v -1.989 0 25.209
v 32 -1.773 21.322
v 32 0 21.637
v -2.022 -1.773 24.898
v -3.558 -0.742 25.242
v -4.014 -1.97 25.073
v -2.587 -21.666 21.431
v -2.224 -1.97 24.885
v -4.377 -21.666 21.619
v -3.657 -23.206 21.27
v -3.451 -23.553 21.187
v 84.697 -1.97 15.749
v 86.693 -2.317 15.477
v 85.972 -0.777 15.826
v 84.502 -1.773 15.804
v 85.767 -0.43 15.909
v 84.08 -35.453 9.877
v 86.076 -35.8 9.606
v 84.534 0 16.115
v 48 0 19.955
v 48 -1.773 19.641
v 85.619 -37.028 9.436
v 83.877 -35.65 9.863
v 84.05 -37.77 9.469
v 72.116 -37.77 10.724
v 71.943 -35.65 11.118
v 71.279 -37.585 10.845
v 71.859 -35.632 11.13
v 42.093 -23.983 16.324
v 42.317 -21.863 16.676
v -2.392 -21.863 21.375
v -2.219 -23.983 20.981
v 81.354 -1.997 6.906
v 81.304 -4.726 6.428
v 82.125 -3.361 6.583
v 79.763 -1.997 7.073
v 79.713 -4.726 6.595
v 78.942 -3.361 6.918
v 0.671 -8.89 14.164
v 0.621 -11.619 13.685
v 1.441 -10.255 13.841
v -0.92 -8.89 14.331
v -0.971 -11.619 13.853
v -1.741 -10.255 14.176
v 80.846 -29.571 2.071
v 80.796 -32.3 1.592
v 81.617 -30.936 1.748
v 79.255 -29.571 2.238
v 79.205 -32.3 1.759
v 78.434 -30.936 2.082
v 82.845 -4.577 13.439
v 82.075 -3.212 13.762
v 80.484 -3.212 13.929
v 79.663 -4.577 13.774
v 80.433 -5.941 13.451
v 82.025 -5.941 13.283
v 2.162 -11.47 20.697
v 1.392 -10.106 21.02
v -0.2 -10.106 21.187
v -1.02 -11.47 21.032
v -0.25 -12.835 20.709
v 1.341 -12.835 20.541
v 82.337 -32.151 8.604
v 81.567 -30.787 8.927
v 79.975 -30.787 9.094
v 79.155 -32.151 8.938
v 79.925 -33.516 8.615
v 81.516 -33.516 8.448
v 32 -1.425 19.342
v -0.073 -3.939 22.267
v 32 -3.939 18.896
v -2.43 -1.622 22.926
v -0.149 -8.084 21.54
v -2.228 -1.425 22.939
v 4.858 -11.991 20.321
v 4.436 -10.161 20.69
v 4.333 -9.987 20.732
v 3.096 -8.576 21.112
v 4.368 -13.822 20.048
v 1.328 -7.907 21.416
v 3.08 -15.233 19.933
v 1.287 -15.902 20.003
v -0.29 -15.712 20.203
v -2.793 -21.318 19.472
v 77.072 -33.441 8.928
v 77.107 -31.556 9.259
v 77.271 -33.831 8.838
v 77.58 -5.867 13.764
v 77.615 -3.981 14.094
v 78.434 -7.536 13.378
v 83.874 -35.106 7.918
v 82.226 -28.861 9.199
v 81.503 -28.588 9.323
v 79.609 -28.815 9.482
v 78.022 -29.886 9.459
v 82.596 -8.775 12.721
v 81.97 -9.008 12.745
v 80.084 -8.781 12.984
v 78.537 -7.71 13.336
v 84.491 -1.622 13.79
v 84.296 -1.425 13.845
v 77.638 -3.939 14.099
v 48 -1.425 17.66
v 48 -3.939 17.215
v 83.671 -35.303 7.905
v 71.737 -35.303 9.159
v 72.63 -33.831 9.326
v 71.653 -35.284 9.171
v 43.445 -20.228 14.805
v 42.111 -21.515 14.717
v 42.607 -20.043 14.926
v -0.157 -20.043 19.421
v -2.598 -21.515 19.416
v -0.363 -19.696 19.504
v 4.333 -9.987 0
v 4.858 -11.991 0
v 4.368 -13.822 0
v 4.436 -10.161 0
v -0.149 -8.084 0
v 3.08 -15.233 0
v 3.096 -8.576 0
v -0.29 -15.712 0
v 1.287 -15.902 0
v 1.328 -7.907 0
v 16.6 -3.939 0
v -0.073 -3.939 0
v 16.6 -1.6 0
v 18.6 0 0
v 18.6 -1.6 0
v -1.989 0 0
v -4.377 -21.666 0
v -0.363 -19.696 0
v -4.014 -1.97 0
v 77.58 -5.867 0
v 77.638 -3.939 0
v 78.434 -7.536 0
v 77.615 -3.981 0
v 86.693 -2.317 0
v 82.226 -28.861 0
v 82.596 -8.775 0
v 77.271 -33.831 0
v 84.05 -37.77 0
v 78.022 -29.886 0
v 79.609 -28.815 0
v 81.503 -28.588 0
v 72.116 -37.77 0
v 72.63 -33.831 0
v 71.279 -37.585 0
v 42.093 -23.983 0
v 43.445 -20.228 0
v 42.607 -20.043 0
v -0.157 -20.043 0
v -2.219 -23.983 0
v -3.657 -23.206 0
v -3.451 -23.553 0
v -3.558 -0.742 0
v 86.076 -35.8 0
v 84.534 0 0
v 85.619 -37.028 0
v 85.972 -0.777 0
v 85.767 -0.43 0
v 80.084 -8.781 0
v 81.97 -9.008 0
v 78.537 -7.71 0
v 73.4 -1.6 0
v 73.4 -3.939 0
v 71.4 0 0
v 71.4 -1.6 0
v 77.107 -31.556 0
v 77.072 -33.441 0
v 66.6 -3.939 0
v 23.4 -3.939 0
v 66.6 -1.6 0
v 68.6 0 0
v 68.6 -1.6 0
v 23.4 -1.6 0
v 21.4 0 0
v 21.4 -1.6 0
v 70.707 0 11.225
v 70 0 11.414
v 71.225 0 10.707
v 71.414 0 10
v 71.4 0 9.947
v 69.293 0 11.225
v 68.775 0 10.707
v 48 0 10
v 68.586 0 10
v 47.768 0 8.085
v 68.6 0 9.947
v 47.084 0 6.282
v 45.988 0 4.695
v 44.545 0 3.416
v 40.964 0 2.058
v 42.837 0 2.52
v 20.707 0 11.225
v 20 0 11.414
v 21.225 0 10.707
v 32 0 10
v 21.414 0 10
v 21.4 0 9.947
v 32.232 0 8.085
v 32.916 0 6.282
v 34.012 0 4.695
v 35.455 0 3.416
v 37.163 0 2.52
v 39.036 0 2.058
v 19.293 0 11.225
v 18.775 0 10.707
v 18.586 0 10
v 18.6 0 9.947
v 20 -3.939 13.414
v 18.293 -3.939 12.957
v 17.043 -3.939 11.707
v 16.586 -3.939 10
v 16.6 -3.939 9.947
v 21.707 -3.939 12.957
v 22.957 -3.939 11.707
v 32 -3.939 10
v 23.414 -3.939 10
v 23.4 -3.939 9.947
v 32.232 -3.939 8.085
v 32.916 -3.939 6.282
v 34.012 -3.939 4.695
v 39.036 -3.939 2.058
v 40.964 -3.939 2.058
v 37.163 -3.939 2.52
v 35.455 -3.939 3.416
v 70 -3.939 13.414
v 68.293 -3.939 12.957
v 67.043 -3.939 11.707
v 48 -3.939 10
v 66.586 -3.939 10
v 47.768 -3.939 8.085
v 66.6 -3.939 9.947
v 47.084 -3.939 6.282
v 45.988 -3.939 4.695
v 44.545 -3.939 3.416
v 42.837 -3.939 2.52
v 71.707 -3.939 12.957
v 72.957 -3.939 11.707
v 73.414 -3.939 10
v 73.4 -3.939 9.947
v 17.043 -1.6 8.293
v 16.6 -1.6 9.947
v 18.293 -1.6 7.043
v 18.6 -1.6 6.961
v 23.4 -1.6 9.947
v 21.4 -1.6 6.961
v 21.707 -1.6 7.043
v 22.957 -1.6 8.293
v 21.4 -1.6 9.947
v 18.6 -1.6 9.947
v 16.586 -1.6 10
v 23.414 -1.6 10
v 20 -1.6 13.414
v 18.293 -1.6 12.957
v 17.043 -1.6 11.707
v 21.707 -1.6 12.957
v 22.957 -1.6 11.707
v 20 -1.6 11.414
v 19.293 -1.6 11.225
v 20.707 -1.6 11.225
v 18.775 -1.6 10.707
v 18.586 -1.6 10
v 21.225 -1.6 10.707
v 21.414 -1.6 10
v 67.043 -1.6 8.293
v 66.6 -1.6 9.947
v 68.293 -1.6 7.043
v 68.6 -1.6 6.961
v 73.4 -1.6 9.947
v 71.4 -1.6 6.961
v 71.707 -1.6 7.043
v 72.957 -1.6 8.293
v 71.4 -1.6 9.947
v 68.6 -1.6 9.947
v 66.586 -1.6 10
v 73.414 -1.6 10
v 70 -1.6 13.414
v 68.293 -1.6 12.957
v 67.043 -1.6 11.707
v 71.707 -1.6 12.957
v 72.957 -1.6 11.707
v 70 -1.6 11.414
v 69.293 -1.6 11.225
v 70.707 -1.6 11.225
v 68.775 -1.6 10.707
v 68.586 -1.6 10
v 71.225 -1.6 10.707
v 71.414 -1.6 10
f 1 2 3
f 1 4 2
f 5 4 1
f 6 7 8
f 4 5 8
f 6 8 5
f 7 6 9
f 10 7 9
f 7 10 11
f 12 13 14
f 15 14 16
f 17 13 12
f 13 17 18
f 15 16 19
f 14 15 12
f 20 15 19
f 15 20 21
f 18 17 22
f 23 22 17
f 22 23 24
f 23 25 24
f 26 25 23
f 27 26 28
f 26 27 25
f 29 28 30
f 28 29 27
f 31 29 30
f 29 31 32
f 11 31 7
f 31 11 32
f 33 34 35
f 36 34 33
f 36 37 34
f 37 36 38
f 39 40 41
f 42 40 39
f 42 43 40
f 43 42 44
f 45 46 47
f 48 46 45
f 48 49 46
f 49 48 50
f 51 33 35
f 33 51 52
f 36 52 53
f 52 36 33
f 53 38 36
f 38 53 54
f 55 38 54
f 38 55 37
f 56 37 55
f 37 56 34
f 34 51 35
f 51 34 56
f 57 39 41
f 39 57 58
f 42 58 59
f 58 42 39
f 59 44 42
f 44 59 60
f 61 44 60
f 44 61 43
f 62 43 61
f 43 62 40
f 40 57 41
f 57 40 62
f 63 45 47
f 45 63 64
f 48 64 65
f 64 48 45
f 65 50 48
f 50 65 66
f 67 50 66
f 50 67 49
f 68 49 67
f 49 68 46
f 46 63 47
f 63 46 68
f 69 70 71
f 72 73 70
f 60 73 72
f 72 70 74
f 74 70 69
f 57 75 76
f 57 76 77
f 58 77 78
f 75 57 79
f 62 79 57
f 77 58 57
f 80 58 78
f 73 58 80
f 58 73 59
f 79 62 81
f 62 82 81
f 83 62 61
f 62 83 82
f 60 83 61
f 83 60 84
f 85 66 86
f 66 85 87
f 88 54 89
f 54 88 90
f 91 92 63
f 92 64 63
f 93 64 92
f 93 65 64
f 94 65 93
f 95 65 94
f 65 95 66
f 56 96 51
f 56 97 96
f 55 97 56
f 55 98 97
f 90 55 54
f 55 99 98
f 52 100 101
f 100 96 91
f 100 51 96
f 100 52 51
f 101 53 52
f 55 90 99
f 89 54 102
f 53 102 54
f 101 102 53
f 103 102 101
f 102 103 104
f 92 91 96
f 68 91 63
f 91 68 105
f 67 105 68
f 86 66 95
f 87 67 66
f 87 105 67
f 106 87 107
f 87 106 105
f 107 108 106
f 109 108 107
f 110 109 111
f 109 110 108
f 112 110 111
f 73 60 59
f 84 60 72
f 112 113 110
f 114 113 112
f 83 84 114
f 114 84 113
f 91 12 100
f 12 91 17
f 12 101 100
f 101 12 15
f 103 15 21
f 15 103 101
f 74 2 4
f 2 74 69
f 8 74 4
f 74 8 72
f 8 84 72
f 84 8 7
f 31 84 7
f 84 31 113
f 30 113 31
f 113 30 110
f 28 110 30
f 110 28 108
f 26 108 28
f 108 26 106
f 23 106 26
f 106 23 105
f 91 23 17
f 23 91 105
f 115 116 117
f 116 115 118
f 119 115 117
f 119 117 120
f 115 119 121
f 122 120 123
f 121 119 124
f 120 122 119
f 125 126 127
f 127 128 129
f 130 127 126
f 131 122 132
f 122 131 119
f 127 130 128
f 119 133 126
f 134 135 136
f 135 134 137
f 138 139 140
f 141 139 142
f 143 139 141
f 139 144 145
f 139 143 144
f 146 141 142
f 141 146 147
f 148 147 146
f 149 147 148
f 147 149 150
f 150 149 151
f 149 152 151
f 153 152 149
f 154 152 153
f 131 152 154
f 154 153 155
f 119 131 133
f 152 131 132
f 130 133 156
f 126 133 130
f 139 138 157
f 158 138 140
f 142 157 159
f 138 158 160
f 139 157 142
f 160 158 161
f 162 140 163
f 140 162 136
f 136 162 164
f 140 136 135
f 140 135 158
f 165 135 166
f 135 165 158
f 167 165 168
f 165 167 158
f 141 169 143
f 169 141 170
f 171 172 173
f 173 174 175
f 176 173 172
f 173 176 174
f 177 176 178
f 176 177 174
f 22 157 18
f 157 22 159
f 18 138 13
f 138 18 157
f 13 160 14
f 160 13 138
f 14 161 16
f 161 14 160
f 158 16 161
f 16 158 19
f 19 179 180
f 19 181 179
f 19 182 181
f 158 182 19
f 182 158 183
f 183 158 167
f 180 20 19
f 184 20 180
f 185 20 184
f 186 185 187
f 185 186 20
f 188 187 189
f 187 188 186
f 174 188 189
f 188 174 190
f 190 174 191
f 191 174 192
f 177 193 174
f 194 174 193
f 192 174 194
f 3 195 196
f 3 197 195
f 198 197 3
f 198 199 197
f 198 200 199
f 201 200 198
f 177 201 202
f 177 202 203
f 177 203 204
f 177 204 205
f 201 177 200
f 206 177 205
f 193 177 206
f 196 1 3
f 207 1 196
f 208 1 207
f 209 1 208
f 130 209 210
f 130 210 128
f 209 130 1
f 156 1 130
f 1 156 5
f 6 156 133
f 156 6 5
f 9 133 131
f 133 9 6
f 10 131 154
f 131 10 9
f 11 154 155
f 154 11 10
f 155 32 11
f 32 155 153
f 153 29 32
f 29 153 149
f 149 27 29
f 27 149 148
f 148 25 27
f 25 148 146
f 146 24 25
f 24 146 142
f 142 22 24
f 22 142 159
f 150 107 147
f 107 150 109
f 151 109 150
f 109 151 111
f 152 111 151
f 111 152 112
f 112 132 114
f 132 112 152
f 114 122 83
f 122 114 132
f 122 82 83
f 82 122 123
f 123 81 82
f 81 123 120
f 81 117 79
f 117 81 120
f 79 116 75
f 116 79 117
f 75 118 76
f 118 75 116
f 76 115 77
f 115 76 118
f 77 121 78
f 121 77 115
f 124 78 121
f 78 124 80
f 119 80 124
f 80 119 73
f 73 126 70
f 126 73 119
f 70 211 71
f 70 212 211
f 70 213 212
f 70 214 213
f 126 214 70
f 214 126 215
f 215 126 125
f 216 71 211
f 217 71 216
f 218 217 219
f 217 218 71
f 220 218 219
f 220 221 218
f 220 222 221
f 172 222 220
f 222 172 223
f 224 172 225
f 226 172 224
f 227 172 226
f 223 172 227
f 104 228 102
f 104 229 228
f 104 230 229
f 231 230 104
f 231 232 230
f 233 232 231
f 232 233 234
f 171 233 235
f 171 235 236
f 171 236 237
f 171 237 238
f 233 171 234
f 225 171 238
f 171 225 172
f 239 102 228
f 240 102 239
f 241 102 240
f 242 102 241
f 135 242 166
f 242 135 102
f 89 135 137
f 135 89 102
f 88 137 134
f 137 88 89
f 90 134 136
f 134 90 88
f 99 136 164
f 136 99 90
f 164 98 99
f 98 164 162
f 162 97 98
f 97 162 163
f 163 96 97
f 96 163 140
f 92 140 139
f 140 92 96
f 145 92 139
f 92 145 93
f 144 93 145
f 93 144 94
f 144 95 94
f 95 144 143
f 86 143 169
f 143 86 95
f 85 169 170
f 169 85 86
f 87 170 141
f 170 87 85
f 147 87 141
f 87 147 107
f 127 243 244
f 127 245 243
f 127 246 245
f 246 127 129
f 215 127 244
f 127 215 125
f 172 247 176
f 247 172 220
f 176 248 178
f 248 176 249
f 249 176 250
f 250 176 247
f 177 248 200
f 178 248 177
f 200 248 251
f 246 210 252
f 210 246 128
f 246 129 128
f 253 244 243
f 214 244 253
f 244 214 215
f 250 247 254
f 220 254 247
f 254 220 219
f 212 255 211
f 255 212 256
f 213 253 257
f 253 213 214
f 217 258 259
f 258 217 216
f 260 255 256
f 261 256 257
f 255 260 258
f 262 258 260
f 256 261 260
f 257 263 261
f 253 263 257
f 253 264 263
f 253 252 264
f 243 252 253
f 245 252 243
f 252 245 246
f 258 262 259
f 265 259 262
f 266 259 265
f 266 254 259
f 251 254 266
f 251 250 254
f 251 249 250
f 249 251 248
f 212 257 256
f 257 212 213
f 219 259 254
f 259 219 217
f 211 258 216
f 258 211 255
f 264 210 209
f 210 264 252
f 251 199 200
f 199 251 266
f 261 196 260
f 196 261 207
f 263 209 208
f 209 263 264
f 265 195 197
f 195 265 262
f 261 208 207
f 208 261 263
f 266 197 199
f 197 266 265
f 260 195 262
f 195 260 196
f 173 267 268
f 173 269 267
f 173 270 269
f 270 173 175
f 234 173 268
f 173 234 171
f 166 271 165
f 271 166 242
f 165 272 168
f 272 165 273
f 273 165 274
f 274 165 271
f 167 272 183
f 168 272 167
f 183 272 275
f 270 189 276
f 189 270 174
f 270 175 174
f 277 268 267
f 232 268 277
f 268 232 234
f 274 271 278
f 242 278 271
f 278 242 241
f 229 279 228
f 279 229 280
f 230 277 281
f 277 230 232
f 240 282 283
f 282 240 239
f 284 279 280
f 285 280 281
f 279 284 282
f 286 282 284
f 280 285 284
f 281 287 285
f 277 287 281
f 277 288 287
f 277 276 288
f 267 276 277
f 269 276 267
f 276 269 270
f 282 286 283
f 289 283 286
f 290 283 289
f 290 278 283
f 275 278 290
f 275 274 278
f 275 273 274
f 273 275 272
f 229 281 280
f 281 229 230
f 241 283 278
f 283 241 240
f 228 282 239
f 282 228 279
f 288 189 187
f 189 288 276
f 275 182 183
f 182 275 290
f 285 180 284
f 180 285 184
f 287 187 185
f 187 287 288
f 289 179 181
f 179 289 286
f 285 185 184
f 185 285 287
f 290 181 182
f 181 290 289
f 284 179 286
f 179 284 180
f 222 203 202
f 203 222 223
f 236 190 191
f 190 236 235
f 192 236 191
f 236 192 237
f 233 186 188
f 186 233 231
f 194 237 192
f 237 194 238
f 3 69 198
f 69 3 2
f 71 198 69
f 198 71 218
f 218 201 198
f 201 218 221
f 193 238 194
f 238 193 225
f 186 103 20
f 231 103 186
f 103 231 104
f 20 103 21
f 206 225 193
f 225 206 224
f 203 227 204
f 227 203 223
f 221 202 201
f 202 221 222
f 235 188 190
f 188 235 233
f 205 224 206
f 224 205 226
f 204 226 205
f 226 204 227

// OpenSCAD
// file: common.scad
module keyswitch_hole(x=0, y=0, a=0) {
    translate([x, y, 0]) {
        rotate([0, 0, 90+a]) {
            linear_extrude(height = 2) {
            square([14, 14], center = true);
            //translate([-8, 3, 0]) square([1, 3]);
            //translate([-8, -6, 0]) square([1, 3]);
            //translate([7, 3, 0]) square([1, 3]);
            //translate([7, -6, 0]) square([1, 3]);
            }
            linear_extrude(height = 0.6) {
                translate([-3, 7]) square([6, 1]);
            translate([-3, -8]) square([6, 1]);
            }
        }
    }
}

keyswitch_hole();

module joint_male_face() {
    translate([-1, 0])
    square([2,4]);
    translate([-3, 2])
    square([6,2]);
}

module joint_male(pos=[0,0]) {
    translate(pos){
      rotate([0,0,180]){
        linear_extrude(height=10)
        joint_male_face();
        
        translate([0,2,10])
        rotate([-90,0,0])
        linear_extrude(height=2)
        circle(3, $fn=12);
        
        translate([0,0,10])
        rotate([-90,0,0])
        linear_extrude(height=2)
        circle(1, $fn=12);
      }
    }
}

module joint_female(pos=[0,0]) {
    translate(pos){
      rotate([0,0,180]){
        linear_extrude(height=10)
        offset(delta=0.4)
        joint_male_face();
        
        translate([0,1.6,10])
        rotate([-90,0,0])
        linear_extrude(height=2.8)
        offset(delta=0.4)
        circle(3, $fn=12);

        translate([0,-0.4,10])
        rotate([-90,0,0])
        linear_extrude(height=2.8)
        offset(delta=0.4)
        circle(1, $fn=12);
      }
    }
}


joint_male([20, 0]);
joint_female([30, 0]);
// main file
use <common.scad>;

thumb_plate_points = [
                [-2,-22],
                [-2, -2],
                [85, -2],
                [85, -36],
                [73, -36],
                [43, -22],
                ];

thumb_plate_sc_points = [
                [-2+3, -12],
                [85-3, -2-3],
                [85-3, -36+3],
                ];

module plate_nohole() {
    linear_extrude(height=2)
    polygon(points=thumb_plate_points);
}


module plate_holes() {
    keyswitch_hole(15, -12);
    keyswitch_hole(15+19, -12);
    keyswitch_hole(55, -15, -15);
    keyswitch_hole(73, -21, -15);
    for(p=thumb_plate_sc_points){
        linear_extrude(height=5)
            translate(p)
            circle(1.6);
    }
}


module thumb_plate() {
    difference() {
        plate_nohole();
        plate_holes();
    }
}


tilt_angle = [10,6,0];
tilt_angle_r = tilt_angle * -1;
height = 25;

module thumb_case_outer_face() {
    projection()
        translate([0,0,height])
        rotate(tilt_angle)
        linear_extrude(height=2)
        offset(2)
        polygon(points=thumb_plate_points);
}

module thumb_case_inner_face() {
    projection()
        translate([0,0,height])
        rotate(tilt_angle)
        linear_extrude(height=2)
        offset(-2)
        polygon(points=thumb_plate_points);
}

module thumb_case_bottom_face() {
    difference(){
        thumb_case_outer_face();
        thumb_case_inner_face();
    }
    projection()
    translate([0,0,height])
    rotate(tilt_angle)
    for(p=thumb_plate_sc_points){
        linear_extrude(height=1)
        translate(p)
        circle(4);
    }
}

module case() {
    difference() {
        linear_extrude(height=50)
            thumb_case_bottom_face();
        translate([0,0,height])
            rotate(tilt_angle){
            linear_extrude(height=50)
                square(200, center=true);
            // screw hole
            translate([0,0,-9])
                linear_extrude(height=9)
                for(p=thumb_plate_sc_points){
                    translate(p)
                        circle(1.6);
                }
            // plate hole
            translate([0,0,-2])
            linear_extrude(height=2)
            offset(0.2)
            polygon(points=thumb_plate_points);
        }
    }
}

module thumb_case_hole() {
    // cable hole
    translate([40,0,0])
    rotate([90,0,0])
    linear_extrude(height=4){
        translate([0, 10])
        circle(8);
        translate([-8,10])
        square([16, 30]);
    }
    for (x = [20,70]) {
        joint_female([x, 0]);
    }
}

module thumb_case() {
    difference() {
        case();
        thumb_case_hole();
    }
}

thumb_case();

//translate([0,10])
//rotate([180,0,0])
//thumb_plate();
